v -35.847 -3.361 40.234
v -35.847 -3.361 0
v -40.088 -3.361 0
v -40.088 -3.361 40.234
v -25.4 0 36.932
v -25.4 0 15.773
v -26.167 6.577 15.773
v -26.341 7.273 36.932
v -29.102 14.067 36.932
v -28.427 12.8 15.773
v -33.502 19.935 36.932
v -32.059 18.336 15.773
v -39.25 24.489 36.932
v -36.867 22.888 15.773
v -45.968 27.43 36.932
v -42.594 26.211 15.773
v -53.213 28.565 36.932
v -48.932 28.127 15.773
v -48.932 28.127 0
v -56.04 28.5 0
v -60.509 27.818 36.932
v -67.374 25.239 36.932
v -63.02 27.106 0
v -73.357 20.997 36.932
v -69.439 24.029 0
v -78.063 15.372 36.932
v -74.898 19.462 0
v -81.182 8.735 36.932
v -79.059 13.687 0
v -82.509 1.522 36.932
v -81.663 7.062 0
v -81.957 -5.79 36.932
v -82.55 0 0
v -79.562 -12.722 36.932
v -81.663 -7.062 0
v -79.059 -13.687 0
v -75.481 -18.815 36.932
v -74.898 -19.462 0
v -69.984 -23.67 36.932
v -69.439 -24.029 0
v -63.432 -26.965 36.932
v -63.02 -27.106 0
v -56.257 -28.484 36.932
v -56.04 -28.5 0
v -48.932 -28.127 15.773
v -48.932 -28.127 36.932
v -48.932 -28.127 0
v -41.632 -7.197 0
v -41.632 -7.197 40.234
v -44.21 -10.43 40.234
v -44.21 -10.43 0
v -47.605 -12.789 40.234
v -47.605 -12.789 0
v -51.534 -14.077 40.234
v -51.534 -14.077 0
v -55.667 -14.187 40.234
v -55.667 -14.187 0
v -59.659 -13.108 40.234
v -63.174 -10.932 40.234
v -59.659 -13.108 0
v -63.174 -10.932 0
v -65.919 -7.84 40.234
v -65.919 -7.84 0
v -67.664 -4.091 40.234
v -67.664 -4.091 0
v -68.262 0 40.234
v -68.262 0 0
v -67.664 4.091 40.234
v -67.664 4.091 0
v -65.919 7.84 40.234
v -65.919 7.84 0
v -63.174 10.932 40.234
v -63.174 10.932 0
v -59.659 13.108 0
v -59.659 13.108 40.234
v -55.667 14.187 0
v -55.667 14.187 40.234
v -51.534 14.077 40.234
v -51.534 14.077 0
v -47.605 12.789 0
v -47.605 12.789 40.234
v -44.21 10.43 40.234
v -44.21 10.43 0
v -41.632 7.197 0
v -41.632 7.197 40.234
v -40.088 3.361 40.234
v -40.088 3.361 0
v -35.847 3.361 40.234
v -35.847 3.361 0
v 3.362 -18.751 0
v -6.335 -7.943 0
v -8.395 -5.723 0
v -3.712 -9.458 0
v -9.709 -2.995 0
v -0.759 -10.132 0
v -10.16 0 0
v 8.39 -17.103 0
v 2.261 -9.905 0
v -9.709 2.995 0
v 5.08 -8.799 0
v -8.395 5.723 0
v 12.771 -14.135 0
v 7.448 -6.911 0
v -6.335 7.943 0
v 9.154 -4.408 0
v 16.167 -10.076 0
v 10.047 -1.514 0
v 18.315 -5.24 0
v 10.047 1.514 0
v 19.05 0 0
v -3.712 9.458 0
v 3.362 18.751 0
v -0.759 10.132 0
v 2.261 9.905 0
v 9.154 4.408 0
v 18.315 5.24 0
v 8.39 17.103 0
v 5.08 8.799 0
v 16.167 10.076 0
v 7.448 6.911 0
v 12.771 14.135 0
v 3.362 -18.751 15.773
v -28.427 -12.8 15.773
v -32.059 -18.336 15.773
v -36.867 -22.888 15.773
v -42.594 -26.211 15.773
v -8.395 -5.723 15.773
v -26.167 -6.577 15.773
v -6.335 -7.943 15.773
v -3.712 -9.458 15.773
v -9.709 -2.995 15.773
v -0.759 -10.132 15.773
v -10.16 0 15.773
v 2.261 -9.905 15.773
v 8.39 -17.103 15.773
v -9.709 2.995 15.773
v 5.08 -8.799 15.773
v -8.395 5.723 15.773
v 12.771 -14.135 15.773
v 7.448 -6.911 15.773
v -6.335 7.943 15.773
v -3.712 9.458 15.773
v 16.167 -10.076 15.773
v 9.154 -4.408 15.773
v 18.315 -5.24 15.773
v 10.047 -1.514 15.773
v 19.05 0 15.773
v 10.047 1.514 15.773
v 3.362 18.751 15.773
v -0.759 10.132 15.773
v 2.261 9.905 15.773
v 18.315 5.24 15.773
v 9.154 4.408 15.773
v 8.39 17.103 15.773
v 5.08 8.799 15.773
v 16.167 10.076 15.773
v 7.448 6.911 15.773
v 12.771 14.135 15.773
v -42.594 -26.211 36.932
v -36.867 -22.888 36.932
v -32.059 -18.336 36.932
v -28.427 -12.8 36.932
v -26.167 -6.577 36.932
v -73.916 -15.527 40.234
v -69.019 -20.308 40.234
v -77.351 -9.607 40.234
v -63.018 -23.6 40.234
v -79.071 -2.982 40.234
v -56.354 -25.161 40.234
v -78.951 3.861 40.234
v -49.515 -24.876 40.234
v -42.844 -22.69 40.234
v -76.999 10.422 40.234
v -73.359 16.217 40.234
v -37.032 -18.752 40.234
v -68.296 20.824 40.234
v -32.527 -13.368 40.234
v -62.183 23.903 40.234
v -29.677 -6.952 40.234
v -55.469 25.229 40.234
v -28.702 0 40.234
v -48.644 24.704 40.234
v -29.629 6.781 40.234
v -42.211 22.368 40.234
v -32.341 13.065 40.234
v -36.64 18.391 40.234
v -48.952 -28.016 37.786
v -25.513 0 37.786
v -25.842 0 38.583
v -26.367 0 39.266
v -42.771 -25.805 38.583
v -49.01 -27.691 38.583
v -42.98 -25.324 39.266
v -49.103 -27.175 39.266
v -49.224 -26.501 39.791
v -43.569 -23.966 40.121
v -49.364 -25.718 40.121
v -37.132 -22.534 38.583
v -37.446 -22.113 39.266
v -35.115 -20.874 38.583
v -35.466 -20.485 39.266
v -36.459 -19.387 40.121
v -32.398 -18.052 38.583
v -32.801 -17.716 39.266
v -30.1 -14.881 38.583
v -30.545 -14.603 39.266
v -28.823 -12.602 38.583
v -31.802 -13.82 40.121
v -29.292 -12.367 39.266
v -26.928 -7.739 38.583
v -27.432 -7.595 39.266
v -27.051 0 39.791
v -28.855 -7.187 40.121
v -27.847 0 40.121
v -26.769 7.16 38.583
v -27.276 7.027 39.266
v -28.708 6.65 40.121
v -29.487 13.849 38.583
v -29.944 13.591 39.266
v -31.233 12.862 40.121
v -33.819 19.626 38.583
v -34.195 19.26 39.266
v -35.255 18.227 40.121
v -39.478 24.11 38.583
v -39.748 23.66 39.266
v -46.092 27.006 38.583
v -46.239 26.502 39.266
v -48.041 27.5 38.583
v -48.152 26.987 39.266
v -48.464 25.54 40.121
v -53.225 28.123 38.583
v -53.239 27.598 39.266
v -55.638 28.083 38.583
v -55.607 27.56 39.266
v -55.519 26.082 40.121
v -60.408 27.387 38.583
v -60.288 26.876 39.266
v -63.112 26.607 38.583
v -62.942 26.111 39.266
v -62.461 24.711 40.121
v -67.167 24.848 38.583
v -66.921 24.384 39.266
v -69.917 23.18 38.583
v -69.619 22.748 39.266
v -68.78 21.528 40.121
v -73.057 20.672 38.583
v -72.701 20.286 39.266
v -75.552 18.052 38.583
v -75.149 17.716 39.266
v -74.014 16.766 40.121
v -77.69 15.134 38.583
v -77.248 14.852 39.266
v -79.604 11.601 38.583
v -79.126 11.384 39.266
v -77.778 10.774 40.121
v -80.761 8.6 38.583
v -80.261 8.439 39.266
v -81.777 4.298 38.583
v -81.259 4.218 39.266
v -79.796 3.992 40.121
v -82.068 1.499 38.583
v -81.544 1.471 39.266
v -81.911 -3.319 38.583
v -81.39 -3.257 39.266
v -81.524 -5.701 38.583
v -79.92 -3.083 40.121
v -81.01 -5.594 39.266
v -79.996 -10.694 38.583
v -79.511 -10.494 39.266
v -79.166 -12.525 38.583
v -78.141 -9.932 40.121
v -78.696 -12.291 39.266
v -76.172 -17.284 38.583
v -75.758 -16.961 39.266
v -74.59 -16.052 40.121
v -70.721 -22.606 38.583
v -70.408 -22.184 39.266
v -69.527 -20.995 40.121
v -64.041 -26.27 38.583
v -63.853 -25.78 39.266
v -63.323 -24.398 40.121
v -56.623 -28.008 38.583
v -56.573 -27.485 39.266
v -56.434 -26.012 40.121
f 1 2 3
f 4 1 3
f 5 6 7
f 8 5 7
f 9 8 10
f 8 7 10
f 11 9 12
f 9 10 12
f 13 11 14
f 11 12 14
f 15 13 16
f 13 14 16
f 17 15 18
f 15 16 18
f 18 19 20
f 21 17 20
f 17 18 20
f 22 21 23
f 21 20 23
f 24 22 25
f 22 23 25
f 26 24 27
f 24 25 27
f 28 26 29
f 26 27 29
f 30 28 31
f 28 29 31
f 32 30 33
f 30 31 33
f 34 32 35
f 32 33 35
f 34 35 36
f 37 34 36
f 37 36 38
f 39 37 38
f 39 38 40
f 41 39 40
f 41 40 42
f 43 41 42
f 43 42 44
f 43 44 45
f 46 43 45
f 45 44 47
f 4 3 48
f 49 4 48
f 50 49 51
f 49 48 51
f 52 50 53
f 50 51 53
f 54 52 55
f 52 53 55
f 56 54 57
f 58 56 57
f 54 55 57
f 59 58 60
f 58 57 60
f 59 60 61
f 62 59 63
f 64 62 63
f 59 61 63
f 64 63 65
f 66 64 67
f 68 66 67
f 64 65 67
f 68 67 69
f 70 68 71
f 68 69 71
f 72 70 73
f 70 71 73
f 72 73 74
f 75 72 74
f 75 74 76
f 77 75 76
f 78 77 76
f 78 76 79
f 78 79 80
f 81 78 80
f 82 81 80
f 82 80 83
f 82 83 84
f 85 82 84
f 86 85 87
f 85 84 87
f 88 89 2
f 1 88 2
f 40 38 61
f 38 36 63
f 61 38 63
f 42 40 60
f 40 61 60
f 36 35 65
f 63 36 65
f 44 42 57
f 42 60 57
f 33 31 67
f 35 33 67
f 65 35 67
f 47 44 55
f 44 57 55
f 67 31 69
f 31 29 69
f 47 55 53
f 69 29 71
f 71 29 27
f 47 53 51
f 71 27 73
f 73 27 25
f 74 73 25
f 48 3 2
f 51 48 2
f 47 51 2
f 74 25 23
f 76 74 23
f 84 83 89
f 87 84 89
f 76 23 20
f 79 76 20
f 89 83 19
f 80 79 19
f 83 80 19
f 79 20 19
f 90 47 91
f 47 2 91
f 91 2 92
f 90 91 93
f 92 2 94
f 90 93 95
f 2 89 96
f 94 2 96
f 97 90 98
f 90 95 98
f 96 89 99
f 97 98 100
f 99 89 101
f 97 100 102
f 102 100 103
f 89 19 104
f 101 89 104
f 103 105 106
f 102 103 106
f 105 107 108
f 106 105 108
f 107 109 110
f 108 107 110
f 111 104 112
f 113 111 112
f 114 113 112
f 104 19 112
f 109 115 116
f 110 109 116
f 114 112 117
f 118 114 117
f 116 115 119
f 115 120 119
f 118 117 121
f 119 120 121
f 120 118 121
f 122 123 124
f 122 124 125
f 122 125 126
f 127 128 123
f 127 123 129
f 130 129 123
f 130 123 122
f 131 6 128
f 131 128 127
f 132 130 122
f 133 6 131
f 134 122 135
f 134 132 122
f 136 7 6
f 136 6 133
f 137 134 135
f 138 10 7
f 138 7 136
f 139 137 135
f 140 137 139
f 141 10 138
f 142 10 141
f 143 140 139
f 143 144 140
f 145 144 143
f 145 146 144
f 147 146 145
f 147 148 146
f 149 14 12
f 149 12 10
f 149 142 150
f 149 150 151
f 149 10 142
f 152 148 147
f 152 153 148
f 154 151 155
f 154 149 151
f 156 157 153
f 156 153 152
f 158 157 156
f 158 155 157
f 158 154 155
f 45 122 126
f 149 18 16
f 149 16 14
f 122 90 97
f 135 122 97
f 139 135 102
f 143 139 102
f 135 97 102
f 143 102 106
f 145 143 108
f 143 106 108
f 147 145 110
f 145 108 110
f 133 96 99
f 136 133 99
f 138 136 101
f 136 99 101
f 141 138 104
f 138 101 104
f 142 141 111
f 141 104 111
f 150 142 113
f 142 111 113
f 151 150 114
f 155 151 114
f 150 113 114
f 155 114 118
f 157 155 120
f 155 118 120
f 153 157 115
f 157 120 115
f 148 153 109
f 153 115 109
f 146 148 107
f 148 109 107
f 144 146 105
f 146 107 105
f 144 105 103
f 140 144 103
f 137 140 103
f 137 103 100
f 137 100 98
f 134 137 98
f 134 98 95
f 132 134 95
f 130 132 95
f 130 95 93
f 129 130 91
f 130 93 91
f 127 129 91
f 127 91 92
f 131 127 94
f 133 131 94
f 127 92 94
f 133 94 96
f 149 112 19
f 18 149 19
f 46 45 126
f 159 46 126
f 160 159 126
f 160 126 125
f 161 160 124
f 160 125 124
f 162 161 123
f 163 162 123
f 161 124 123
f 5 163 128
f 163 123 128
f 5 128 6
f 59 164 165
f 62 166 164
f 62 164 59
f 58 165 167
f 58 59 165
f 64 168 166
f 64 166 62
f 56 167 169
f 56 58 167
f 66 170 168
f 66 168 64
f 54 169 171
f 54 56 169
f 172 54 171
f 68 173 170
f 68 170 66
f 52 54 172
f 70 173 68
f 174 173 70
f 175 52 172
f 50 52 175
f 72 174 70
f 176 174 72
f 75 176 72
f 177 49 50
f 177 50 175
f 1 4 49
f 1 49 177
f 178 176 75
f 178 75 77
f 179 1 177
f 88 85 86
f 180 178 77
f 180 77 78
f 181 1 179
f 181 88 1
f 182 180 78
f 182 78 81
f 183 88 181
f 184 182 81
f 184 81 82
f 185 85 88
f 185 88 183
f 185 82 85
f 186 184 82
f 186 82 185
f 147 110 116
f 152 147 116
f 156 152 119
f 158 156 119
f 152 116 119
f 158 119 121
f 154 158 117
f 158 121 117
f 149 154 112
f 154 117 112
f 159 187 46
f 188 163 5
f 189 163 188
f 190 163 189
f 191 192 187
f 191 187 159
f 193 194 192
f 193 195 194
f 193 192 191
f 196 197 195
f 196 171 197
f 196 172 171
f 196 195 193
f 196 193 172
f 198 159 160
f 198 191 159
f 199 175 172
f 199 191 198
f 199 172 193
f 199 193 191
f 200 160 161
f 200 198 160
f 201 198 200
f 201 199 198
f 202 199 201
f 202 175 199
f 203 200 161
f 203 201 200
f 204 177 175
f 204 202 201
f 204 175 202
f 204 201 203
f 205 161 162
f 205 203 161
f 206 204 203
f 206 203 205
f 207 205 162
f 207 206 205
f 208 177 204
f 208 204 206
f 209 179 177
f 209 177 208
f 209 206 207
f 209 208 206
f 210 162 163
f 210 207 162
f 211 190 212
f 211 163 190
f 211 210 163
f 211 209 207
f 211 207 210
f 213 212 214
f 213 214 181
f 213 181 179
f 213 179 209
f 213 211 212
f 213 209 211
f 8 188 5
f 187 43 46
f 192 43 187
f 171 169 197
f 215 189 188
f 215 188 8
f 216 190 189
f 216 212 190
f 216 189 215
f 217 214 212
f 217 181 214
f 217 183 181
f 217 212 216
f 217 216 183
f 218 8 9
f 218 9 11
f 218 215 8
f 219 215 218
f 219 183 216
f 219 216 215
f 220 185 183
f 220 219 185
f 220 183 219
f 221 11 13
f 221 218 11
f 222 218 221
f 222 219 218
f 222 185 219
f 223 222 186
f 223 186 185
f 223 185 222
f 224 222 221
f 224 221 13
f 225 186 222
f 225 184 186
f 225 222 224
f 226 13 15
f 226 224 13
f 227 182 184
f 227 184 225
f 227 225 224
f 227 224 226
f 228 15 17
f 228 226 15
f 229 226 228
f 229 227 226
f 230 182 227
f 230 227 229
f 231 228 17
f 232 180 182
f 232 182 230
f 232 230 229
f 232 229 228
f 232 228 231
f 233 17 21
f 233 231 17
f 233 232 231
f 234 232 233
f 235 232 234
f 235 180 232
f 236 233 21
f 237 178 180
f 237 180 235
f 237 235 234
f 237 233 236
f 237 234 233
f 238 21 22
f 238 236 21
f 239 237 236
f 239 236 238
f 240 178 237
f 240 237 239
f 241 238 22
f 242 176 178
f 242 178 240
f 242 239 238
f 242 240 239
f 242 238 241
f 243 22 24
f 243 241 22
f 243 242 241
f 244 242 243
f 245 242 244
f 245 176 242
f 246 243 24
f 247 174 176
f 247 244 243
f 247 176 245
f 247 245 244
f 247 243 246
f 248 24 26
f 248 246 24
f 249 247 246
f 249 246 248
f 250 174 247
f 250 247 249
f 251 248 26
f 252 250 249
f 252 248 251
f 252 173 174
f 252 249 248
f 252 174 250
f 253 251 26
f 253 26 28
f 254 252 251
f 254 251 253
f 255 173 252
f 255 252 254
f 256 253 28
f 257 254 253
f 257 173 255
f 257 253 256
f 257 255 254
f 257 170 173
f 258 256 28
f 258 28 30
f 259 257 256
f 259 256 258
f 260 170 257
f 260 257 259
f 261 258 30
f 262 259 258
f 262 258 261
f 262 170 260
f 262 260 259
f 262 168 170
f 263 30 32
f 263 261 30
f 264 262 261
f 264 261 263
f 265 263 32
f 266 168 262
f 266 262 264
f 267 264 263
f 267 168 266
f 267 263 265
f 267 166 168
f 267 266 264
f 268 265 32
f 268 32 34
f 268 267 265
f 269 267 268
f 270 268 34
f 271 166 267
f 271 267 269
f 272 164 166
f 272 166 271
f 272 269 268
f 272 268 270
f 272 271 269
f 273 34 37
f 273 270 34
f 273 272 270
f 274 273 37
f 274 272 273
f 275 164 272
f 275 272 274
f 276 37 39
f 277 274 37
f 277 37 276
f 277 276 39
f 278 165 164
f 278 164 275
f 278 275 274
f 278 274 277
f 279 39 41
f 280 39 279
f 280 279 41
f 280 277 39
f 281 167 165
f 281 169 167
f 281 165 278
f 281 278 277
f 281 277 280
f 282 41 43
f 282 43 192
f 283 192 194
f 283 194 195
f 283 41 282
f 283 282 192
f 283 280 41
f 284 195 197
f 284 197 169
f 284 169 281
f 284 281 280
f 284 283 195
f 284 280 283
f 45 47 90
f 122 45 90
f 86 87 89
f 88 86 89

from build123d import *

# Parameters (mm, degrees)
F1_DEPTH = 15.7734
F2_DEPTH = 40.2336
F3_DEPTH = 15.7734
F4_R     = 3.302


with BuildPart() as f1:
    # F0 (on Top) → F1 (new body)
    with BuildSketch(Plane.XY):
        with BuildLine():
            ThreePointArc((3.3617647059, 18.7510276535), (-12.2241744579, 14.6106830375), (-19.05, 0))
            ThreePointArc((-19.05, 0), (-12.2241744579, -14.6106830375), (3.3617647059, -18.7510276535))
            ThreePointArc((3.3617647059, -18.7510276535), (14.6106830375, -12.2241744579), (19.05, 0))
            ThreePointArc((19.05, 0), (14.6106830375, 12.2241744579), (3.3617647059, 18.7510276535))
        make_face()
        with BuildLine():
            ThreePointArc((10.16, 0), (0, -10.16), (-10.16, 0))
            ThreePointArc((-10.16, 0), (0, 10.16), (10.16, 0))
        make_face(mode=Mode.SUBTRACT)
        with BuildLine():
            Line((-25.4, 0), (-19.05, 0))
            ThreePointArc((-19.05, 0), (-12.2241744579, 14.6106830375), (3.3617647059, 18.7510276535))
            Line((3.3617647059, 18.7510276535), (-48.9323529132, 28.1265414752))
            ThreePointArc((-48.9323529132, 28.1265414752), (-32.0589754346, 18.3362616759), (-25.4, 0))
        make_face()
    extrude(amount=F1_DEPTH)

    # F0 (on Top) → F2 (join)
    with BuildSketch(Plane.XY):
        with BuildLine():
            ThreePointArc((-48.9323529412, -28.1265414802), (-32.0589754437, -18.3362616868), (-25.4, 0))
            ThreePointArc((-25.4, 0), (-32.0589754346, 18.3362616759), (-48.9323529132, 28.1265414752))
            ThreePointArc((-48.9323529132, 28.1265414752), (-82.55, 1.42e-08), (-48.9323529412, -28.1265414802))
        make_face()
        with BuildLine():
            Line((-35.8466429449, 3.3609804232), (-35.8466429449, 0))
            Line((-35.8466429449, 0), (-35.8466429449, -3.3609804232))
            Line((-35.8466429449, -3.3609804232), (-40.0884429449, -3.3609804232))
            ThreePointArc((-40.0884429449, -3.3609804232), (-68.2625, 0), (-40.0884429449, 3.3609804232))
            Line((-40.0884429449, 3.3609804232), (-35.8466429449, 3.3609804232))
        make_face(mode=Mode.SUBTRACT)
    extrude(amount=F2_DEPTH)

    # F0 (on Top) → F3 (join)
    with BuildSketch(Plane.XY):
        with BuildLine():
            ThreePointArc((3.3617647059, -18.7510276535), (-12.2241744579, -14.6106830375), (-19.05, 0))
            Line((-19.05, 0), (-25.4, 0))
            ThreePointArc((-25.4, 0), (-32.0589754437, -18.3362616868), (-48.9323529412, -28.1265414802))
            Line((-48.9323529412, -28.1265414802), (3.3617647059, -18.7510276535))
        make_face()
    extrude(amount=F3_DEPTH)

    # F4
    f4_edges = [f1.edges().sort_by_distance(p)[0] for p in [
        (-59.017647, 28.126541, 40.2336),
    ]]
    fillet(f4_edges, radius=F4_R)


solid = f1.part
